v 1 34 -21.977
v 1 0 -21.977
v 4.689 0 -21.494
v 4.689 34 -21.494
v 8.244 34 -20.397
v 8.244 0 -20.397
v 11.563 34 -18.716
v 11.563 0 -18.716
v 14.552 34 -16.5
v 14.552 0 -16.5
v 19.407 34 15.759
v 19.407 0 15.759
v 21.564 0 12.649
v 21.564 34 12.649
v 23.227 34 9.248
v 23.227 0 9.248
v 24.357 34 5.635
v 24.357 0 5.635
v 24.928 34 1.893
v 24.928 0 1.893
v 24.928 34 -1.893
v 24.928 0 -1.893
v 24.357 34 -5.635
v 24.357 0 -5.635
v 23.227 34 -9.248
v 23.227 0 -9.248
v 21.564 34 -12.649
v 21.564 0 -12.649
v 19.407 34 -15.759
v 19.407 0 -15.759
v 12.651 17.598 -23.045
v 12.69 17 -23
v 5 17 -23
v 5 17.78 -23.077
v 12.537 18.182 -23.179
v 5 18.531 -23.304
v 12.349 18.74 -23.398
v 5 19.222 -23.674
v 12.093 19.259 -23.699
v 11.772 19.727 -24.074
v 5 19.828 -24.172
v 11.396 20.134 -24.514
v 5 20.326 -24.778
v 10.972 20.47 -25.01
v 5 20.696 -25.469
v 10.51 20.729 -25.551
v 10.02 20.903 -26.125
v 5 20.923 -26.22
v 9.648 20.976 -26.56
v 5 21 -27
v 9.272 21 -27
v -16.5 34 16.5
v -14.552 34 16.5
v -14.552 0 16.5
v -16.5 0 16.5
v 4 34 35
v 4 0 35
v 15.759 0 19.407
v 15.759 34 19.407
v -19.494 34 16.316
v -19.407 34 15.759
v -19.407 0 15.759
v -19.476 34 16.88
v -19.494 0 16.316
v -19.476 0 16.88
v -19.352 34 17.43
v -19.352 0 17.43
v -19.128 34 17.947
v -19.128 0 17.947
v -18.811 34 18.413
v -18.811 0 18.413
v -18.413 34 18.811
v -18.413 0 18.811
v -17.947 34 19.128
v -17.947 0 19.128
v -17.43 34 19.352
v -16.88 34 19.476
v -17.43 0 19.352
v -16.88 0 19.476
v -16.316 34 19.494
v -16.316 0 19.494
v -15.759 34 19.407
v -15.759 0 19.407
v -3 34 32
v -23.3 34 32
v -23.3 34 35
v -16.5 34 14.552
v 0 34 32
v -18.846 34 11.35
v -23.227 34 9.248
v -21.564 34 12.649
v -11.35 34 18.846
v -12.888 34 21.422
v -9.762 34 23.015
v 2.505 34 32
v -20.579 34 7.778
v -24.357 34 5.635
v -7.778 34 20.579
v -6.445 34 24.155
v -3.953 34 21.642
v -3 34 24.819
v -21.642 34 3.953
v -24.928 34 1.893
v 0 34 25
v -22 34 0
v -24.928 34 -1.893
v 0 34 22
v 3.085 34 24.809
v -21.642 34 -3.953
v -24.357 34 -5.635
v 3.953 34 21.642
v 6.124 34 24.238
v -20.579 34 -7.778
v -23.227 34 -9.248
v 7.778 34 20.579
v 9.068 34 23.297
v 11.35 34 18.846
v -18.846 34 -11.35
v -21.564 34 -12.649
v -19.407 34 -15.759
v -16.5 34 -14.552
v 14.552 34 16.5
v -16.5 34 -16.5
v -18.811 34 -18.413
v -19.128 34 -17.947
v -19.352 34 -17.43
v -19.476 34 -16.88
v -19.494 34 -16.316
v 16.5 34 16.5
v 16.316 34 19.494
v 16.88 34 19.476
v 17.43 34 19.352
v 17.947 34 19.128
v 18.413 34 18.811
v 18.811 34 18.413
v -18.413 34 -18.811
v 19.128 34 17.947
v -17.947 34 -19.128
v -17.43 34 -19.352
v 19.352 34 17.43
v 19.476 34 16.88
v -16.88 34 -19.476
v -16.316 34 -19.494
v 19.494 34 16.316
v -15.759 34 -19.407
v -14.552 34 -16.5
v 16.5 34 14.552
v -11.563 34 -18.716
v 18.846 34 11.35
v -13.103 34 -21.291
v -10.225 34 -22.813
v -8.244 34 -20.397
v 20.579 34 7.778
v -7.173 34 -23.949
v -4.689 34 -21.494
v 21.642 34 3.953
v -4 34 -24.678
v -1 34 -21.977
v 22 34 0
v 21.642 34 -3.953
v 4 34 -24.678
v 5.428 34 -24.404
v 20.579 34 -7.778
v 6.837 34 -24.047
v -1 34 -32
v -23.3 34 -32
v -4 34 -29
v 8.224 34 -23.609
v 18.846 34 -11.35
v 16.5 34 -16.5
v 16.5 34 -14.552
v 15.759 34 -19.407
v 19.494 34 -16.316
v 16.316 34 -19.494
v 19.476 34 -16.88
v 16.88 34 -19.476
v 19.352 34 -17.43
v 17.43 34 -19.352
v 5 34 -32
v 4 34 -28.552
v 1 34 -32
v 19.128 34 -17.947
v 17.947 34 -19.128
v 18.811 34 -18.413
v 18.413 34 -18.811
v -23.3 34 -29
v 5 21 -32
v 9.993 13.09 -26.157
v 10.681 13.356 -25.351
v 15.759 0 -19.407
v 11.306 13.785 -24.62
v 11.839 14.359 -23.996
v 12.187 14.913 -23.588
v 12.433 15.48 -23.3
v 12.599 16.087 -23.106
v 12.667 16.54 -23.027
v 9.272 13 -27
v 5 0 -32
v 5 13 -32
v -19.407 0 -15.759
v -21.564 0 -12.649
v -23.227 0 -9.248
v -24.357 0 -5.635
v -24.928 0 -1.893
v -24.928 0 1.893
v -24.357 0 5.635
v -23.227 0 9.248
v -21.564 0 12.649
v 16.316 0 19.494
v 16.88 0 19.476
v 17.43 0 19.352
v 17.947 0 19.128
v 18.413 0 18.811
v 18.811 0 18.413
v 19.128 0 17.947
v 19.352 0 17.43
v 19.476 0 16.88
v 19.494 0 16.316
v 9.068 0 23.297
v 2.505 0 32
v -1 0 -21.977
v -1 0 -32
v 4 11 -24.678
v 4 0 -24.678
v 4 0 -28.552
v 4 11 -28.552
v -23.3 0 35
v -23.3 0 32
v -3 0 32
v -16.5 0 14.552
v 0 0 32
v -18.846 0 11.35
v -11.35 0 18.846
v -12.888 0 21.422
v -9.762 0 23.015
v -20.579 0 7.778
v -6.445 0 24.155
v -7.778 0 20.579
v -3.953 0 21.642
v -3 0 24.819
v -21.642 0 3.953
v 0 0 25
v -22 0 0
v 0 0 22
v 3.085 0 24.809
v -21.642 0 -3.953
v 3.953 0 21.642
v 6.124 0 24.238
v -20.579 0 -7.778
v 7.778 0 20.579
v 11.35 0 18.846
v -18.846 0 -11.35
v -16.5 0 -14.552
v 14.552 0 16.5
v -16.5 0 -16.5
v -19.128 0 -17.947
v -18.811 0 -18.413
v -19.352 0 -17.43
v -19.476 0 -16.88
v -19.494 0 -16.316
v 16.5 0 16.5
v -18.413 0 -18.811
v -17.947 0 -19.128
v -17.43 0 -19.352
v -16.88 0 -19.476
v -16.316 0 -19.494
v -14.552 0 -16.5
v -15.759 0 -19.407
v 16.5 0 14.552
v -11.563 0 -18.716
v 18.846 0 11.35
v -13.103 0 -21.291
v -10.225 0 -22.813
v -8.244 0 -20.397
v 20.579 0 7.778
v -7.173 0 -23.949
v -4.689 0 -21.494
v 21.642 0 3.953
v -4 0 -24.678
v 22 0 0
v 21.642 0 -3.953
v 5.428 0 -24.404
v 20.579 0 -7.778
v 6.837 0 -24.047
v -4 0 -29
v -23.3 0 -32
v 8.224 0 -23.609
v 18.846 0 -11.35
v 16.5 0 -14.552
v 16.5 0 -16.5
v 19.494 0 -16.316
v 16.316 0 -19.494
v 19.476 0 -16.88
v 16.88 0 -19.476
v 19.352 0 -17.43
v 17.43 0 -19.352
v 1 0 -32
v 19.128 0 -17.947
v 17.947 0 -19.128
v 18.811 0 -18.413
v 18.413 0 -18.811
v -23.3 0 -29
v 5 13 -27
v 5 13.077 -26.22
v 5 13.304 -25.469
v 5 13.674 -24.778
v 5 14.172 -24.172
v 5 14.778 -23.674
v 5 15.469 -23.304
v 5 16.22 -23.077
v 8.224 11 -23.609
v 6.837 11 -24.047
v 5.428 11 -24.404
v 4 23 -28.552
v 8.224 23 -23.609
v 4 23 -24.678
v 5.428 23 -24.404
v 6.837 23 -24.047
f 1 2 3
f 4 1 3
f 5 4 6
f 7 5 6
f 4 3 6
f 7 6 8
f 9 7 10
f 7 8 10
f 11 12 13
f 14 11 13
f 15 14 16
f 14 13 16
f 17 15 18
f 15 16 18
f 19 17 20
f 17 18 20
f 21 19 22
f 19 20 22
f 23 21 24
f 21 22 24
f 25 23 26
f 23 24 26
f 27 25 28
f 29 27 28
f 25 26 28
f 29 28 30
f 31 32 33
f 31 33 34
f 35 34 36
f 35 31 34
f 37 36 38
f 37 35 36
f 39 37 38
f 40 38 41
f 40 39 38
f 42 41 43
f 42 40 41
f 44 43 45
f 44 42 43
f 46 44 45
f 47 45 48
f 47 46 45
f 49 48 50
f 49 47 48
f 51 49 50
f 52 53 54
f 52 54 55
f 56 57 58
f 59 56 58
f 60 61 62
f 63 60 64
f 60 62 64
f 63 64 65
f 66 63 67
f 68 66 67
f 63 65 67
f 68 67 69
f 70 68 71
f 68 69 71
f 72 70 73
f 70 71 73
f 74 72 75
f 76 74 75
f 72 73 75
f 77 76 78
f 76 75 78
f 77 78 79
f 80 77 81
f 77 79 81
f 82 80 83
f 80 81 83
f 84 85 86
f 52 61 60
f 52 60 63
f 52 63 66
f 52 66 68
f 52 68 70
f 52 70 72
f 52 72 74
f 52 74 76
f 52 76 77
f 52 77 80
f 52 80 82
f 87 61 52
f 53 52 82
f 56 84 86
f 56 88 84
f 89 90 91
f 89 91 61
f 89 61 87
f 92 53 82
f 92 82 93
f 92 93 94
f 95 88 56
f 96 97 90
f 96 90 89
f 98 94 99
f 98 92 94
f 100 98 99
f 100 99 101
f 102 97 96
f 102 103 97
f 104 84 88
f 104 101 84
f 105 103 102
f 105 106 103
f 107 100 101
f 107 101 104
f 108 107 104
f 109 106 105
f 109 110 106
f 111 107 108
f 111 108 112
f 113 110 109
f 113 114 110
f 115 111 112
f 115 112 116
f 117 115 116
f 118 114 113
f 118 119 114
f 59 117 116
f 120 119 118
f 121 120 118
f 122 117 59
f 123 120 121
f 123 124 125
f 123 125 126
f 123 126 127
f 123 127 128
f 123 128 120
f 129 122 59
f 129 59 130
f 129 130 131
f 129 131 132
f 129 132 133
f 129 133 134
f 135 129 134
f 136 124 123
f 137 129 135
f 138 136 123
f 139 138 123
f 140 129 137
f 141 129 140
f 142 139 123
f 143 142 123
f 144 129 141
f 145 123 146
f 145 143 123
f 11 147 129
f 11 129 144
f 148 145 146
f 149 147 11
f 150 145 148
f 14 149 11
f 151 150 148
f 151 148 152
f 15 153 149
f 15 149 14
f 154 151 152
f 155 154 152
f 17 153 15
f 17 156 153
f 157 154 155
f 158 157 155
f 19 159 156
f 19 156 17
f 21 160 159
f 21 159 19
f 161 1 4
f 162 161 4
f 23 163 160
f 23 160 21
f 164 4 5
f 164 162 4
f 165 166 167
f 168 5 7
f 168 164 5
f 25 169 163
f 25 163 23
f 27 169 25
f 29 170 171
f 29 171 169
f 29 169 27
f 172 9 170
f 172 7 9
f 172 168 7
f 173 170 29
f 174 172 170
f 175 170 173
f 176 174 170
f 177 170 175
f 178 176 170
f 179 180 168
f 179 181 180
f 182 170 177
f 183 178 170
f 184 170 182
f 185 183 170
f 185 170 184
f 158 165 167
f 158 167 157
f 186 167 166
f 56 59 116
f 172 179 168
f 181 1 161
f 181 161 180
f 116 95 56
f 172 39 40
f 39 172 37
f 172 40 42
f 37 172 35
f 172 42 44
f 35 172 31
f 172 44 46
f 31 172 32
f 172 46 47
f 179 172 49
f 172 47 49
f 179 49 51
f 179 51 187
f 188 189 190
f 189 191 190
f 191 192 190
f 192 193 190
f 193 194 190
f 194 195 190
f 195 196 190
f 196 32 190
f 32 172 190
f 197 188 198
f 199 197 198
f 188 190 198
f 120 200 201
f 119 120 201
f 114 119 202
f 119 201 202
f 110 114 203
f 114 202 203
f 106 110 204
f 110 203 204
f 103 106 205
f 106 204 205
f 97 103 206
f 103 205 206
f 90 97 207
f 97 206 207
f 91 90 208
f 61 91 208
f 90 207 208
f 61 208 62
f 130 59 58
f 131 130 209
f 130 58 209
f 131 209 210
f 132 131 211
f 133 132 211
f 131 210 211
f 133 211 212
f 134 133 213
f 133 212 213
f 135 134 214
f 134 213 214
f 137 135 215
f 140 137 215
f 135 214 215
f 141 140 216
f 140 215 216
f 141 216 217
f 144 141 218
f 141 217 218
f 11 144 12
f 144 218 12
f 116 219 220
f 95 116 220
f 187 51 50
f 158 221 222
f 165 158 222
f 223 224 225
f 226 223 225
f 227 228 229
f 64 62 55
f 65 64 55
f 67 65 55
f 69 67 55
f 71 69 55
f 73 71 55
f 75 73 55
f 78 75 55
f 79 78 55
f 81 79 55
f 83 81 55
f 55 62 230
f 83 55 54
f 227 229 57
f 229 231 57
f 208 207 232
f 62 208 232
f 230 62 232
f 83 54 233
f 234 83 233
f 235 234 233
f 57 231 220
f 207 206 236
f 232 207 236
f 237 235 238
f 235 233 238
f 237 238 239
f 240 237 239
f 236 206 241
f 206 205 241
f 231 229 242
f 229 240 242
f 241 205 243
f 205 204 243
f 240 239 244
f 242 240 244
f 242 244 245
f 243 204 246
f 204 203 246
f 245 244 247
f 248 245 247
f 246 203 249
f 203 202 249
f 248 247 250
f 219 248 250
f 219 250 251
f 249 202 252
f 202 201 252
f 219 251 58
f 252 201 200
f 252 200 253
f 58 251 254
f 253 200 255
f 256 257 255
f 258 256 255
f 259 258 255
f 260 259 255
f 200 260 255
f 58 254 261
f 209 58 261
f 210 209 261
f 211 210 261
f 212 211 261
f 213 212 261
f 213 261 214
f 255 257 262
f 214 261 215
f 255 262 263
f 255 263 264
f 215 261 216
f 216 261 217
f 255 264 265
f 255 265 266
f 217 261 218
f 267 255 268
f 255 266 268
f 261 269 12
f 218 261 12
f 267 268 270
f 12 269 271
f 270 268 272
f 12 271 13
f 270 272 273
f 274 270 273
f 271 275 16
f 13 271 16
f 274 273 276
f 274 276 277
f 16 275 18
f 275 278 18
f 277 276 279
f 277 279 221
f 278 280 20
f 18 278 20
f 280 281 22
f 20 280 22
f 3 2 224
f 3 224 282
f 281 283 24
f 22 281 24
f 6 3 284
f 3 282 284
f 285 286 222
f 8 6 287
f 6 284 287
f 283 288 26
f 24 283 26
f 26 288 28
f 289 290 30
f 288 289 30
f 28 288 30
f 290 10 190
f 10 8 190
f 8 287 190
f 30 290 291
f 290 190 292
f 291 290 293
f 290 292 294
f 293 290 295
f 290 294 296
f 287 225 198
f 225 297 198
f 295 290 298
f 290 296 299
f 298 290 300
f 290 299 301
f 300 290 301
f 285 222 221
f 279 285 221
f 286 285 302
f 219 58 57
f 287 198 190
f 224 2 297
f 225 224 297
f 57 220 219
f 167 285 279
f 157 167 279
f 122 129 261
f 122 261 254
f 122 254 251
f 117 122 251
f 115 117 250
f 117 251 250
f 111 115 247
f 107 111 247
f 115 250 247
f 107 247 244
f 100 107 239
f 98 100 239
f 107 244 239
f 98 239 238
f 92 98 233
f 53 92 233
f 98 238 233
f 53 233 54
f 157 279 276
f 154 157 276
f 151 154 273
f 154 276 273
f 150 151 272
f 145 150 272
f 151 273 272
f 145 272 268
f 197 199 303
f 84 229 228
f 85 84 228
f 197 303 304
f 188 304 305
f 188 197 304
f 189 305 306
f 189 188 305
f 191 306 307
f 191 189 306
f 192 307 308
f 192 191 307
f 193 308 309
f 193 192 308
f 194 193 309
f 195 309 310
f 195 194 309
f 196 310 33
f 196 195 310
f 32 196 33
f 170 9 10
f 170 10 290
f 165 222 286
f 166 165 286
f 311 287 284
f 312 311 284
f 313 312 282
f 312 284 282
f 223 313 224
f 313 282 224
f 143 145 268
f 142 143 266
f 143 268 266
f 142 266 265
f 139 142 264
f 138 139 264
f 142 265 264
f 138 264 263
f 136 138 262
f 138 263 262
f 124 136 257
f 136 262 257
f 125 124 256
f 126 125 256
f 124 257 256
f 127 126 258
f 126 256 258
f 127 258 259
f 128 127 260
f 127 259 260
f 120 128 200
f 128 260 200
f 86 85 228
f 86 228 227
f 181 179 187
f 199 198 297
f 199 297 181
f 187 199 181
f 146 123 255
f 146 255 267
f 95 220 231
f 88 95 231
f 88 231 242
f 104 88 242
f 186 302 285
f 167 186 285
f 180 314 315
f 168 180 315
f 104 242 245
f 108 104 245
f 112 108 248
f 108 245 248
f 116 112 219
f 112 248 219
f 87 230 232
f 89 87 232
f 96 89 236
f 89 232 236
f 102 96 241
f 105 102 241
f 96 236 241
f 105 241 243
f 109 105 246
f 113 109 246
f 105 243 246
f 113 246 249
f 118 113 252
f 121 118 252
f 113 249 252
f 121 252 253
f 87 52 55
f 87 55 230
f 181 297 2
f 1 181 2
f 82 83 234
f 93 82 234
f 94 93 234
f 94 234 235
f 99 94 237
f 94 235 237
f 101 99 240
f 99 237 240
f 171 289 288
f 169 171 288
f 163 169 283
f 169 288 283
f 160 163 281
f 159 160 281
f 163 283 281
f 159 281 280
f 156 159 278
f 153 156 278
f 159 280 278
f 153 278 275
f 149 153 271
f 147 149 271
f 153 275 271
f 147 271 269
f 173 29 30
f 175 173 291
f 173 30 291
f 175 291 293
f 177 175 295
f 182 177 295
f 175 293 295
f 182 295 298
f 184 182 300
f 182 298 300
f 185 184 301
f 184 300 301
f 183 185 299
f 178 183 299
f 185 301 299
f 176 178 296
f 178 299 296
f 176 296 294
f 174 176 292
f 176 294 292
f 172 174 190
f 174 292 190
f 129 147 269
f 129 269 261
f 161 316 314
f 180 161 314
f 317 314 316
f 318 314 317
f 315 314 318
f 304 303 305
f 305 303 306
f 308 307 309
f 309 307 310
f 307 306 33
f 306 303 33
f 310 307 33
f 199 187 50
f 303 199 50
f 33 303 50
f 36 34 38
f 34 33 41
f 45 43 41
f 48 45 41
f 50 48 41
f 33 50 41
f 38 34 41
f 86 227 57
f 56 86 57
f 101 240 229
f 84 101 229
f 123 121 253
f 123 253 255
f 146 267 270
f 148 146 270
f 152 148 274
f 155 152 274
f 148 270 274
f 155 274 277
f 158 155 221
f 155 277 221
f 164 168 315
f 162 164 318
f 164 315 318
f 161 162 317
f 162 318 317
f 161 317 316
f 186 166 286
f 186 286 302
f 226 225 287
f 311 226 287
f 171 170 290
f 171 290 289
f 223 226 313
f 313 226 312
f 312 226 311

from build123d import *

# Parameters (mm, degrees)
BOSS_EXTRUDE1_DEPTH = 34
BOSS_EXTRUDE3_DEPTH = 12
CUT_EXTRUDE1_DEPTH  = 14.407172


with BuildPart() as part:
    # Sketch1 → Boss-Extrude1 (new body)
    with BuildSketch(Plane(origin=(0, 0, 0), x_dir=(1, 0, 0), z_dir=(0, 1, 0))):
        with BuildLine():
            Line((14.551632211, 16.5), (16.5, 16.5))
            Line((16.5, 16.5), (16.5, 14.551632211))
            ThreePointArc((16.5, 14.551632211), (22, 0), (16.5, -14.551632211))
            Line((16.5, -14.551632211), (16.5, -16.5))
            Line((16.5, -16.5), (14.551632211, -16.5))
            ThreePointArc((14.551632211, -16.5), (0, -22), (-14.551632211, -16.5))
            Line((-14.551632211, -16.5), (-16.5, -16.5))
            Line((-16.5, -16.5), (-16.5, -14.551632211))
            ThreePointArc((-16.5, -14.551632211), (-22, 0), (-16.5, 14.551632211))
            Line((-16.5, 14.551632211), (-16.5, 16.5))
            Line((-16.5, 16.5), (-14.551632211, 16.5))
            ThreePointArc((-14.551632211, 16.5), (-8.243992543, 20.396974946), (-1, 21.977260976))
            Line((-1, 21.977260976), (-1, 32))
            Line((-1, 32), (-23.299524673, 32))
            Line((-23.299524673, 32), (-23.299524673, 29))
            Line((-23.299524673, 29), (-4, 29))
            Line((-4, 29), (-4, 24.677925359))
            ThreePointArc((-4, 24.677925359), (-10.225195, 22.813272172), (-15.759494281, 19.407172386))
            ThreePointArc((-15.759494281, 19.407172386), (-18.621320344, 18.621320344), (-19.407172386, 15.759494281))
            ThreePointArc((-19.407172386, 15.759494281), (-25, 0), (-19.407172386, -15.759494281))
            ThreePointArc((-19.407172386, -15.759494281), (-18.621320344, -18.621320344), (-15.759494281, -19.407172386))
            ThreePointArc((-15.759494281, -19.407172386), (-9.7623033, -23.015156621), (-3, -24.819347292))
            Line((-3, -24.819347292), (-3, -32))
            Line((-3, -32), (-23.299524673, -32))
            Line((-23.299524673, -32), (-23.299524673, -35))
            Line((-23.299524673, -35), (4, -35))
            Line((4, -35), (15.759494281, -19.407172386))
            ThreePointArc((15.759494281, -19.407172386), (18.621320344, -18.621320344), (19.407172386, -15.759494281))
            ThreePointArc((19.407172386, -15.759494281), (25, 0), (19.407172386, 15.759494281))
            ThreePointArc((19.407172386, 15.759494281), (18.621320344, 18.621320344), (15.759494281, 19.407172386))
            Line((15.759494281, 19.407172386), (5, 32))
            Line((5, 32), (1, 32))
            Line((1, 32), (1, 21.977260976))
            ThreePointArc((1, 21.977260976), (8.243992543, 20.396974946), (14.551632211, 16.5))
        make_face()
        with BuildLine():
            ThreePointArc((0, -25), (4.613293609, -24.570663851), (9.068134921, -23.297401766))
            Line((9.068134921, -23.297401766), (2.504979303, -32))
            Line((2.504979303, -32), (0, -32))
            Line((0, -32), (0, -25))
        make_face(mode=Mode.SUBTRACT)
        with BuildLine():
            ThreePointArc((8.223751321, 23.608683026), (6.135213434, 24.235493725), (4, 24.677925359))
            Line((4, 24.677925359), (4, 28.552128404))
            Line((4, 28.552128404), (8.223751321, 23.608683026))
        make_face(mode=Mode.SUBTRACT)
    extrude(amount=BOSS_EXTRUDE1_DEPTH)

    # Sketch6 → Boss-Extrude3 (add)
    with BuildSketch(Plane(origin=(0, 23, 0), x_dir=(0, 0, -1), z_dir=(0, -1, 0))):
        Polygon((30.717367885, 3.963704263), (22.785433959, 3.963704263), (22.785433959, 10.604126234), align=None)
    extrude(amount=BOSS_EXTRUDE3_DEPTH)

    # Sketch3 → Cut-Extrude1 (cut)
    with BuildSketch(Plane.ZY.offset(-19.407172386)):
        with BuildLine():
            ThreePointArc((-23, 17), (-24.171572875, 19.828427125), (-27, 21))
            Line((-27, 21), (-27, 13))
            ThreePointArc((-27, 13), (-24.171572875, 14.171572875), (-23, 17))
        make_face()
        with BuildLine():
            Line((-27, 13), (-27, 21))
            ThreePointArc((-27, 21), (-31, 17), (-27, 13))
        make_face()
        with BuildLine():
            Line((-27, 21), (-32, 21))
            Line((-32, 21), (-32, 13))
            Line((-32, 13), (-27, 13))
            ThreePointArc((-27, 13), (-31, 17), (-27, 21))
        make_face()
    extrude(amount=CUT_EXTRUDE1_DEPTH, mode=Mode.SUBTRACT)


solid = part.part
